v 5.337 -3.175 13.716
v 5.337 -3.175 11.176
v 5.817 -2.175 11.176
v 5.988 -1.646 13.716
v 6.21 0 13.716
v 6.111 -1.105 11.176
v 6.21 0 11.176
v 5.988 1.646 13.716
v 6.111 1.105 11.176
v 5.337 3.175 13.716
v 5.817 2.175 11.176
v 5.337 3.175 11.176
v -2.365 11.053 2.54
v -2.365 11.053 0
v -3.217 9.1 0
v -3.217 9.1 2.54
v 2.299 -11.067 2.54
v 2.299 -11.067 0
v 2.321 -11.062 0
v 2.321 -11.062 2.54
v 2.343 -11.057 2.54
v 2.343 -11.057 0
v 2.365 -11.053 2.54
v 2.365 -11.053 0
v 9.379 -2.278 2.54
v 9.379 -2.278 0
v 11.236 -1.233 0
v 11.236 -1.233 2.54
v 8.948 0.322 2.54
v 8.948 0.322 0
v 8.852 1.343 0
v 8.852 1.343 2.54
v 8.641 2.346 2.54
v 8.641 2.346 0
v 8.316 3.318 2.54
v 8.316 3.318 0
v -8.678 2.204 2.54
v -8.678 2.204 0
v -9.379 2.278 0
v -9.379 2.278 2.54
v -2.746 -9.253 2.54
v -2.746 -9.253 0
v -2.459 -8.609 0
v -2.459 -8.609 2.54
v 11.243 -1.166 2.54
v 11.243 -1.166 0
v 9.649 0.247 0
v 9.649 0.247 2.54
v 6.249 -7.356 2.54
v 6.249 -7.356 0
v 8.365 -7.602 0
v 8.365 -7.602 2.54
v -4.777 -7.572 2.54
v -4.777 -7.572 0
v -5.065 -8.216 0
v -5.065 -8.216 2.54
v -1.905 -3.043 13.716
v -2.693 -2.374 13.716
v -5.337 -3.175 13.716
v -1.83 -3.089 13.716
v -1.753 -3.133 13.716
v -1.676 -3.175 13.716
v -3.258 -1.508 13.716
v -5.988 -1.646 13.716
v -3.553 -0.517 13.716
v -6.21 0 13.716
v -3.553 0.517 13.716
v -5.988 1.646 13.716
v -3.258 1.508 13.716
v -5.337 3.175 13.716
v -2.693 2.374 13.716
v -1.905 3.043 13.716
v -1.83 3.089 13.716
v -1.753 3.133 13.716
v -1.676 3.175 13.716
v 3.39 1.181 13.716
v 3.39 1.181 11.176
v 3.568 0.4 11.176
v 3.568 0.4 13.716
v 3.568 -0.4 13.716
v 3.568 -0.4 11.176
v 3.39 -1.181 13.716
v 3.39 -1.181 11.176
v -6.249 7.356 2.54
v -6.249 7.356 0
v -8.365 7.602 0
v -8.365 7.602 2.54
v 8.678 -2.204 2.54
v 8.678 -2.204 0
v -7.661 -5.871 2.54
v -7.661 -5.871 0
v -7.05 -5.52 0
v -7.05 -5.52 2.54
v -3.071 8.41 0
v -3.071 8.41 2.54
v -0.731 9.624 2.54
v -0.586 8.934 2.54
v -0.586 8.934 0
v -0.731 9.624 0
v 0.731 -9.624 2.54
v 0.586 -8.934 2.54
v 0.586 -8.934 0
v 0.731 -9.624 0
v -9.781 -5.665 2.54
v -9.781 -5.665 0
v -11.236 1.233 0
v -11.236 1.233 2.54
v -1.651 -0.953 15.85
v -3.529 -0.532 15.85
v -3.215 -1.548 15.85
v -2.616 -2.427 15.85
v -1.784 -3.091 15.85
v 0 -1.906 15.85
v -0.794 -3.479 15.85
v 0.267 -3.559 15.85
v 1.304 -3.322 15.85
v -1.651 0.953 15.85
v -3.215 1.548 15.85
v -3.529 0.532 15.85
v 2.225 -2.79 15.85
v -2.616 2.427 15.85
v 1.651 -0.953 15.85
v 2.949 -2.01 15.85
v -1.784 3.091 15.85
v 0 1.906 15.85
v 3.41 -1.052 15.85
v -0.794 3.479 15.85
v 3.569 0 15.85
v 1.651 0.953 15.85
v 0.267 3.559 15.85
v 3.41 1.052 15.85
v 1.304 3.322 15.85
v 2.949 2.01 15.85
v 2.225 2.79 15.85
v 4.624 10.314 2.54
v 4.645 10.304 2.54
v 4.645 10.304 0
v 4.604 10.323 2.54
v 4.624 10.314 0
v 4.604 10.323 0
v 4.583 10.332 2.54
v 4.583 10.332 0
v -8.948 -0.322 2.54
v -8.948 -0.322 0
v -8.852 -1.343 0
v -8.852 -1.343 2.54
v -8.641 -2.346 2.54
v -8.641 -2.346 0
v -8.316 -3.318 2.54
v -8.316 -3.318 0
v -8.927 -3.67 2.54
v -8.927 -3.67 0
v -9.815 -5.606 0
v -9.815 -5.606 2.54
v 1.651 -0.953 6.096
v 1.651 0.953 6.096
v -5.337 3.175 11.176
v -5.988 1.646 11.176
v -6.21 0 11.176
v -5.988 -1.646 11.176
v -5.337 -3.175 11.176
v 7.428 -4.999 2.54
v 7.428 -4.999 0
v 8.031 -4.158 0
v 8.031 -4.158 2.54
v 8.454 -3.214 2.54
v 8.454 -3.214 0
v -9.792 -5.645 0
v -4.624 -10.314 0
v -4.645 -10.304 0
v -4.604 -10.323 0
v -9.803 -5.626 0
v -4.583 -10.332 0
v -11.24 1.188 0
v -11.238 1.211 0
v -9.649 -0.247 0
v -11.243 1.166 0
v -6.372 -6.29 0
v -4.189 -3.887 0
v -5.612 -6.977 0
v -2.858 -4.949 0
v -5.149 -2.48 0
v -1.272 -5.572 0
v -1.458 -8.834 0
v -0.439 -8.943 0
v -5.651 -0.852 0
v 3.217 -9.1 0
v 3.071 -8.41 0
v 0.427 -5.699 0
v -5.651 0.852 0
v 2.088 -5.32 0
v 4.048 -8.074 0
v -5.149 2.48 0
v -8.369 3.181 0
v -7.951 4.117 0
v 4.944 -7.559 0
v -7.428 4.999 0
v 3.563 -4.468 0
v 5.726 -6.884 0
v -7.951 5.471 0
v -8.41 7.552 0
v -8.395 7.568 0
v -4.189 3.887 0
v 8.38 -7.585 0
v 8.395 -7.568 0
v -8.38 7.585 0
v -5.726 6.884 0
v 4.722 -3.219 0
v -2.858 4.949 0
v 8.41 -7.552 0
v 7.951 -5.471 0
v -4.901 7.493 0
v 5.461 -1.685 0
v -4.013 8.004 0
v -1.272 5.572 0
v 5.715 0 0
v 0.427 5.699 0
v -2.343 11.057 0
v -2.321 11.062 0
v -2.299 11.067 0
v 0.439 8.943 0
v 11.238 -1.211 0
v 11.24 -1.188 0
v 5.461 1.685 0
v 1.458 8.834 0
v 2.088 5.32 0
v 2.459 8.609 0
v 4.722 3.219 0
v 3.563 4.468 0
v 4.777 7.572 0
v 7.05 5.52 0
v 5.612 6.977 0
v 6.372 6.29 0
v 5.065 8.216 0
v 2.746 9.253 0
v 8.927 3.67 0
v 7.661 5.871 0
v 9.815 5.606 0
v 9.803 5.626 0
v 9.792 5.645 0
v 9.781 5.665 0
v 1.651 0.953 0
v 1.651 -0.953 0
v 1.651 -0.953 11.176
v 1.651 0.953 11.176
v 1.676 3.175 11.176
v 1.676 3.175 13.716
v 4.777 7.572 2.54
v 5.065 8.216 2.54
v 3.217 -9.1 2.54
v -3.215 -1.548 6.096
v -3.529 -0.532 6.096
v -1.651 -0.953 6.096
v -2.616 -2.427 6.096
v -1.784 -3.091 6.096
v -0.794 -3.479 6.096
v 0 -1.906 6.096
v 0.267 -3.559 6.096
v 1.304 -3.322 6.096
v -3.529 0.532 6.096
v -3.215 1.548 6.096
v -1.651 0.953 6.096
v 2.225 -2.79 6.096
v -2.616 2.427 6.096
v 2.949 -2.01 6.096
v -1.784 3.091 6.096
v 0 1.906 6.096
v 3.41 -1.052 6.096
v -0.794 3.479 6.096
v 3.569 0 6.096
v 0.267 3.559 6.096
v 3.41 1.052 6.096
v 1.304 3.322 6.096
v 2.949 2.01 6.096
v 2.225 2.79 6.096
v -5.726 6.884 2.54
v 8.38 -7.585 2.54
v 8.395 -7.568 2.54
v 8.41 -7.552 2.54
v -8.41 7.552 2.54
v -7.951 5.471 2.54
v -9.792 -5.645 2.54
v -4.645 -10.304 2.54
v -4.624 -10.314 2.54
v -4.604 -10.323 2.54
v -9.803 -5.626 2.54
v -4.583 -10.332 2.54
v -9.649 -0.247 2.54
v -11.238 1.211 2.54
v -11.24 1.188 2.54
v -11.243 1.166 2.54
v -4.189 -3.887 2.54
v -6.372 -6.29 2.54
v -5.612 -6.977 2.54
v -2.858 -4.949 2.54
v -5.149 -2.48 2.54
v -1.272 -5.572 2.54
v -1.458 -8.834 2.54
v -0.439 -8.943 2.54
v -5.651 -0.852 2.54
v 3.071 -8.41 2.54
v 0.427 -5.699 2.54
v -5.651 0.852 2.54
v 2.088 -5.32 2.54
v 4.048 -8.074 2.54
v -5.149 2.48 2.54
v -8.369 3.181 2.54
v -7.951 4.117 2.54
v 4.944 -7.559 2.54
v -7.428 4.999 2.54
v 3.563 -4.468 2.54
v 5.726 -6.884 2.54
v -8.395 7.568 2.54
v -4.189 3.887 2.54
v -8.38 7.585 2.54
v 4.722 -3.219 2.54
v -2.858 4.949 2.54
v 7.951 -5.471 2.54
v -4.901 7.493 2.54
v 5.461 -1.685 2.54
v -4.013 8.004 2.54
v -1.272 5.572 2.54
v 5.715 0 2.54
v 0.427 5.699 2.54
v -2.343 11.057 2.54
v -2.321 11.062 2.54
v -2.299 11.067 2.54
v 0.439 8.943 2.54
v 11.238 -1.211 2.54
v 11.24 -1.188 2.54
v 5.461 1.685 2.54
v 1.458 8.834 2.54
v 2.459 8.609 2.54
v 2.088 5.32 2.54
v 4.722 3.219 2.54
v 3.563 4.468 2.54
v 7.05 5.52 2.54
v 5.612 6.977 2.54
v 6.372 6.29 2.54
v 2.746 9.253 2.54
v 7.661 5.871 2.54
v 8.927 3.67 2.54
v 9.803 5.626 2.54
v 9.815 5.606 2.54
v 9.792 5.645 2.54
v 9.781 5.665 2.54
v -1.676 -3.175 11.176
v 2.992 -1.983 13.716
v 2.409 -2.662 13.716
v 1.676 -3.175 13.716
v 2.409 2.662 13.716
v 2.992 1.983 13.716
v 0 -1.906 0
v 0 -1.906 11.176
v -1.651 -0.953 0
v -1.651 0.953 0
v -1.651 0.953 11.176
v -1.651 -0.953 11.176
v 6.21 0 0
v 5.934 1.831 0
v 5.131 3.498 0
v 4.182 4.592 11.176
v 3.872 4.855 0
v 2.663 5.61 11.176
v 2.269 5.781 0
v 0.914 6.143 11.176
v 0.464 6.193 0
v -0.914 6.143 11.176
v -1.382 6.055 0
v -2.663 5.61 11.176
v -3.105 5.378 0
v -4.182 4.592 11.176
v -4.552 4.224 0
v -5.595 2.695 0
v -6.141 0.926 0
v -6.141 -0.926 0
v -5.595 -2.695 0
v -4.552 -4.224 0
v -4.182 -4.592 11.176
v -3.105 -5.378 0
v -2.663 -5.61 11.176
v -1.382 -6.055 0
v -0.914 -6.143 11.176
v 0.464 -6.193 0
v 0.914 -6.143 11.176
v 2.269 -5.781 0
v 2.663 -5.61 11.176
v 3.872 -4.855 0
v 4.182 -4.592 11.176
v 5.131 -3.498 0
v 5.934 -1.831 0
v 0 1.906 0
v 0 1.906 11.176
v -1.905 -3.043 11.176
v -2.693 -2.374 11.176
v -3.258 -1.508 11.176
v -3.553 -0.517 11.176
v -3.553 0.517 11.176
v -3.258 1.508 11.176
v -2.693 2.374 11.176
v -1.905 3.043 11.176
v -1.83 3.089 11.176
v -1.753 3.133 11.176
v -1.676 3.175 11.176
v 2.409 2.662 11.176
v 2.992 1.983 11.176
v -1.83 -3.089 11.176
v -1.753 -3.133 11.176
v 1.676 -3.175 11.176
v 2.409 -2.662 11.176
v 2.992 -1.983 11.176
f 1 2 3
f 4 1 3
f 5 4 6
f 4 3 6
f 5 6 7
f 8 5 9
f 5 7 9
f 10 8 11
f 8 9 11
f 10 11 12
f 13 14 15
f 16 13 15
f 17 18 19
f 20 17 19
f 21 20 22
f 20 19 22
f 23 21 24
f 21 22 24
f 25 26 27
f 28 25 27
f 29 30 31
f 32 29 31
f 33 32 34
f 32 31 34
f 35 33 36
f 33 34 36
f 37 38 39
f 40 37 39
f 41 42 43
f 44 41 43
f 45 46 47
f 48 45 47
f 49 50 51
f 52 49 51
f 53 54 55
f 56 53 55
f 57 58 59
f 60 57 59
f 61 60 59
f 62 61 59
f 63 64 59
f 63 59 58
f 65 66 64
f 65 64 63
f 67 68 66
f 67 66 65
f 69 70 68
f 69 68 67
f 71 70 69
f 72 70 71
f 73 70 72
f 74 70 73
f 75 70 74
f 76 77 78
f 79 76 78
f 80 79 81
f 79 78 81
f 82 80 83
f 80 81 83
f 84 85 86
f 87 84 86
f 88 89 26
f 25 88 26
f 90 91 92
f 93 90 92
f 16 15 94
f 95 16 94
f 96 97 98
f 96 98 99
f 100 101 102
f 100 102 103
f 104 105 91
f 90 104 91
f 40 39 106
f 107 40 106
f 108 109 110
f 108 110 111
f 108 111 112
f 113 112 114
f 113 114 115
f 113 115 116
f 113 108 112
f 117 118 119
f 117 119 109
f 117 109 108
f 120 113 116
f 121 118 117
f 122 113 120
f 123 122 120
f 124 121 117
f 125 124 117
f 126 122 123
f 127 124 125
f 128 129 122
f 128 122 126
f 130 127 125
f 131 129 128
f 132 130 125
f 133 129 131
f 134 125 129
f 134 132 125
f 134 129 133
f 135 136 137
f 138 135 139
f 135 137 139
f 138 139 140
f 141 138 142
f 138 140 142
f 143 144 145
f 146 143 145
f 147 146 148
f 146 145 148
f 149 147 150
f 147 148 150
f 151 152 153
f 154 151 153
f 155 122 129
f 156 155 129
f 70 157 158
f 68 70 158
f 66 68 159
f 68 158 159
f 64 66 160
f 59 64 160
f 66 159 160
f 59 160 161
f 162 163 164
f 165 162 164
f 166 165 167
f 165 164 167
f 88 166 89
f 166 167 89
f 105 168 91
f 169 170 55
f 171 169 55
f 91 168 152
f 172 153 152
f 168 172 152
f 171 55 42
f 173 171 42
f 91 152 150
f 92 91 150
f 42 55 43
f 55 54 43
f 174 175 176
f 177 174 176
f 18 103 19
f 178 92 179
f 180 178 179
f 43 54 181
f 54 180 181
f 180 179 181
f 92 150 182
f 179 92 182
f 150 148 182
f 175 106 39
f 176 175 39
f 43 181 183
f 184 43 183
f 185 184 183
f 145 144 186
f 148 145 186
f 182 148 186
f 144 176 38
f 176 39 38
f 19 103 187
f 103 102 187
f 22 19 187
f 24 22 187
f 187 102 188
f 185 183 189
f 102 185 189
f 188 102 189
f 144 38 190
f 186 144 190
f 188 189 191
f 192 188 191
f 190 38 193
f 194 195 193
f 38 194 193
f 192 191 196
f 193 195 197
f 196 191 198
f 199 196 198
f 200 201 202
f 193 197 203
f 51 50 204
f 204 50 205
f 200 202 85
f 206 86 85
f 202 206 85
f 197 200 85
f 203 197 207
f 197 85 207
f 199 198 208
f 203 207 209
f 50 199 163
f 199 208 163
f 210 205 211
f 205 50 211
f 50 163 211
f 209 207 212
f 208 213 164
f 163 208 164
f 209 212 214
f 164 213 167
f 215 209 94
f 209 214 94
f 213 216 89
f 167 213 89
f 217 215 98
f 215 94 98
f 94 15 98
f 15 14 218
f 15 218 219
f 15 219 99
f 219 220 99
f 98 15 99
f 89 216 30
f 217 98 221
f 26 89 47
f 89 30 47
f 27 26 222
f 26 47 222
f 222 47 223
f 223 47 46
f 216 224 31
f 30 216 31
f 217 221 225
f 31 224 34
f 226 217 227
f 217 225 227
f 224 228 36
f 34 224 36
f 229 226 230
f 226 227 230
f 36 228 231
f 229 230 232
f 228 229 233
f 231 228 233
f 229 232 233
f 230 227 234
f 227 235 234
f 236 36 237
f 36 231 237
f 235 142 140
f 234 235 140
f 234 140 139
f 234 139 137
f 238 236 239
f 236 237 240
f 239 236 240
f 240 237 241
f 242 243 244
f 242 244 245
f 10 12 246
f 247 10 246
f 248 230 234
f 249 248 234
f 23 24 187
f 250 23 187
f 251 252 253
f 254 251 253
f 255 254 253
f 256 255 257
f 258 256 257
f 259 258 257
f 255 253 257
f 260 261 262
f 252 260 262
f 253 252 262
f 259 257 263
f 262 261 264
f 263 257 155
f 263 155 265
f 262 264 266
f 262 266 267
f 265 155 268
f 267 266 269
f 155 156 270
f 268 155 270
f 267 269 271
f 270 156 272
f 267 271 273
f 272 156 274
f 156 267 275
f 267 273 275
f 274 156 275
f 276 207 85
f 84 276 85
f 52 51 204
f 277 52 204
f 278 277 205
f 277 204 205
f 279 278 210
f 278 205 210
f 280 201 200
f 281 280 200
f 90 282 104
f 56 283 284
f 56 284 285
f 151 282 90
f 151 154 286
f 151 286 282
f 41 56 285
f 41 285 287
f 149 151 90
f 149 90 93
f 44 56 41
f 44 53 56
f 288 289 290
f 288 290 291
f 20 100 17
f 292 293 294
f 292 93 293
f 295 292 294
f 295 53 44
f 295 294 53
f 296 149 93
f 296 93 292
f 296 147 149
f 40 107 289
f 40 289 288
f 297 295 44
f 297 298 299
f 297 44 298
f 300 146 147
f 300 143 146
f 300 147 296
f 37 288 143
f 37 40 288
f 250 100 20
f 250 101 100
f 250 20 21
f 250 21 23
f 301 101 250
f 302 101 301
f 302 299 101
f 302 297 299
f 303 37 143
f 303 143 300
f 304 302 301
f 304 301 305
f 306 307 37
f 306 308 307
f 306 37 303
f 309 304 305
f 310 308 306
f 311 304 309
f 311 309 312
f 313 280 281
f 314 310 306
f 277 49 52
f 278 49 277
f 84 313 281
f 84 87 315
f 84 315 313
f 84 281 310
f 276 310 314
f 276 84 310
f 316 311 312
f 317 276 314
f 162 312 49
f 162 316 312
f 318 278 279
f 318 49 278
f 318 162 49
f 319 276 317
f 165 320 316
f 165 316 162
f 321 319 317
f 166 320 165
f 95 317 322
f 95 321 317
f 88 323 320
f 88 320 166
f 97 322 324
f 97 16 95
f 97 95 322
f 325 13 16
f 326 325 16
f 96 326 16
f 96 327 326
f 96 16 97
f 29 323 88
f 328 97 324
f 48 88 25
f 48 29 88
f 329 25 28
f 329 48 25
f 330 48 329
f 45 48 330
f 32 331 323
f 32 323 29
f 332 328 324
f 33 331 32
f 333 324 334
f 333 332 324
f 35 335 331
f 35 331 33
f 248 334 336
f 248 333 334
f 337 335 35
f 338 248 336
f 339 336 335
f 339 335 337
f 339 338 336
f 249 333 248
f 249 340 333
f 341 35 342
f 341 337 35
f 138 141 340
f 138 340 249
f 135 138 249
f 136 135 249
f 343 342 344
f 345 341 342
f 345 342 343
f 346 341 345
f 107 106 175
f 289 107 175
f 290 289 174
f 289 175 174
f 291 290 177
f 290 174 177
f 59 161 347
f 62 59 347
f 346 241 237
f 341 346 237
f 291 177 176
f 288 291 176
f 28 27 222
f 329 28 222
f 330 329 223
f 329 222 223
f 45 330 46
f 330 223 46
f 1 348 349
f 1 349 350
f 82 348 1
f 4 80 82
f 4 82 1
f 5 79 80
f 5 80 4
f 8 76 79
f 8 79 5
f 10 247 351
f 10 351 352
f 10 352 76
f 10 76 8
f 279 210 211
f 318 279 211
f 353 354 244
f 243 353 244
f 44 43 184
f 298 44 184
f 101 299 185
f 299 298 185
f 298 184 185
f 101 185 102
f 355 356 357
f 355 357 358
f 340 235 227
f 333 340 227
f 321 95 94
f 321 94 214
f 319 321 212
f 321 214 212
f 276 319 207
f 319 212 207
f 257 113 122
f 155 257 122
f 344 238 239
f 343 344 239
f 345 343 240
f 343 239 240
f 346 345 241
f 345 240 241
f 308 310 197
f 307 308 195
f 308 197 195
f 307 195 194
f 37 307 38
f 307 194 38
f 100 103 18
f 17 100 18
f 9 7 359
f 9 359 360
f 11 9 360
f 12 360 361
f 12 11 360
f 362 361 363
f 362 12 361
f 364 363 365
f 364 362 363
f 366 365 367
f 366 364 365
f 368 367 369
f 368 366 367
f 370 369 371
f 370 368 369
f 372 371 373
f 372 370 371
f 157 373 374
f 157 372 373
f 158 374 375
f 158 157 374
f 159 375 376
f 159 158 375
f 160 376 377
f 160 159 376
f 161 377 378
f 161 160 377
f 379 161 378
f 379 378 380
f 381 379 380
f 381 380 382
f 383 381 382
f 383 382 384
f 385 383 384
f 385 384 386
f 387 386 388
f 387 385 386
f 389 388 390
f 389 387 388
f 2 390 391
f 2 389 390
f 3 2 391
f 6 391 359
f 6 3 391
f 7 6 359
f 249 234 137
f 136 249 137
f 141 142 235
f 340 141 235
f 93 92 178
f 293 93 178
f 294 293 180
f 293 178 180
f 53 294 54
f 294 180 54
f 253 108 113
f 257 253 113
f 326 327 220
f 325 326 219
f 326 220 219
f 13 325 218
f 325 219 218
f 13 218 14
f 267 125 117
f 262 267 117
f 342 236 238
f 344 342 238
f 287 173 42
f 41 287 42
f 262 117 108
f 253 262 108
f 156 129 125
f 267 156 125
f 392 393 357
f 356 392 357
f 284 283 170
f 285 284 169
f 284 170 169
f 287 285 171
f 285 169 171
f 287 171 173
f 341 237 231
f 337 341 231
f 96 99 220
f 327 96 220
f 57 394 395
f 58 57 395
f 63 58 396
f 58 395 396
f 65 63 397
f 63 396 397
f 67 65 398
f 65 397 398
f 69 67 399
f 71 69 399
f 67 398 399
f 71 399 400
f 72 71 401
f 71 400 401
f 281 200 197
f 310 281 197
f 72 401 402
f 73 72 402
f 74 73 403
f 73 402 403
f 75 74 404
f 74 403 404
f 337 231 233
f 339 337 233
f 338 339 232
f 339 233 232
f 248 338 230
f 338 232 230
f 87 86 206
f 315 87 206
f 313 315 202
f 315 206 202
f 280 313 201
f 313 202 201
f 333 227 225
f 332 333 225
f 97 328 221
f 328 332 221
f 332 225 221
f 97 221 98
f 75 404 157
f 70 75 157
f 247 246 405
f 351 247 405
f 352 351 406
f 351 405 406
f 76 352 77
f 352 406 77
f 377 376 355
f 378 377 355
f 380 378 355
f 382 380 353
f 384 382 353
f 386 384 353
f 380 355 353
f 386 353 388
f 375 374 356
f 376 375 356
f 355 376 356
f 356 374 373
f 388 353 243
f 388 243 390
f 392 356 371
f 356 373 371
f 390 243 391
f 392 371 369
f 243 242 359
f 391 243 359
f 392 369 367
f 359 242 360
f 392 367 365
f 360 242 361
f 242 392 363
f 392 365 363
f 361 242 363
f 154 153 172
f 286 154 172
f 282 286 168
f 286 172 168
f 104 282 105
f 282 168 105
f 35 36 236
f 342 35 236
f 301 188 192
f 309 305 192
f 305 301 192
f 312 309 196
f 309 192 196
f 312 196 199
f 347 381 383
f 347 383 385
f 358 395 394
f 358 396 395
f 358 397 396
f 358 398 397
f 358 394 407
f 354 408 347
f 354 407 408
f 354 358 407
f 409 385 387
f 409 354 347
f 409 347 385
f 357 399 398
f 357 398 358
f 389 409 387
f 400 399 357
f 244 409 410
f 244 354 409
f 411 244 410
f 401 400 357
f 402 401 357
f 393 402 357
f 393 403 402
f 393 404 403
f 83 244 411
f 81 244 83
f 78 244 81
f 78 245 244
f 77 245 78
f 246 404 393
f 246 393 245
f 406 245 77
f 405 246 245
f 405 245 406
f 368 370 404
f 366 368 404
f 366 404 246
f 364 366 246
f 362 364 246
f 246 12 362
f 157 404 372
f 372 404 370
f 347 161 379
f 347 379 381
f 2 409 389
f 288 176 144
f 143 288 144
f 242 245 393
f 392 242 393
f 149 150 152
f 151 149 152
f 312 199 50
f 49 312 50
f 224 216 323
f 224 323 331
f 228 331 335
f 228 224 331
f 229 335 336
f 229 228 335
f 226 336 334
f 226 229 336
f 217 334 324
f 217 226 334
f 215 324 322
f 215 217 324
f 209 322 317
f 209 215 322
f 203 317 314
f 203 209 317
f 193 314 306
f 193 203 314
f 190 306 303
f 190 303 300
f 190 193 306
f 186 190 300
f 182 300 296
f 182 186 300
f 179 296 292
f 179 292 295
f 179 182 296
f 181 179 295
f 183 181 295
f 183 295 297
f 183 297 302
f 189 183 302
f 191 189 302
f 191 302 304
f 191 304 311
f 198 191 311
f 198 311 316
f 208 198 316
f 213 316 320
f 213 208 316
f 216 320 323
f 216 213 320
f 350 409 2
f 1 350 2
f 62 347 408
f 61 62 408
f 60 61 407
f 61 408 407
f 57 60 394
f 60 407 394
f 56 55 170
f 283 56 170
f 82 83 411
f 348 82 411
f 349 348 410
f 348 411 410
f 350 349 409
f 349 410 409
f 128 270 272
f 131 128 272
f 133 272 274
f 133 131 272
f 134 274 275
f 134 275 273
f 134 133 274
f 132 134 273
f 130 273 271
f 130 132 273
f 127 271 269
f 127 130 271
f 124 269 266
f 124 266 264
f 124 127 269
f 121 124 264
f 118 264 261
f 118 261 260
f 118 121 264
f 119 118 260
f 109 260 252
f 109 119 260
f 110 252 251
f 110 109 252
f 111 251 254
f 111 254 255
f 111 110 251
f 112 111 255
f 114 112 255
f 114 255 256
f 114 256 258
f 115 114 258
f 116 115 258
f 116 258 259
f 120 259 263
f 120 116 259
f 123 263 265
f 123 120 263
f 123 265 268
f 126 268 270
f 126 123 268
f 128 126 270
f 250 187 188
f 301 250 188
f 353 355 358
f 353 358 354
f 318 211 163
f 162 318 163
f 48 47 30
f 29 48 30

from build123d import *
from build123d import SkipClean  # not in build123d's __all__

# Parameters (mm, degrees)
F0_R           = 11.303
F0_R_2         = 5.715
F1_DEPTH       = 2.54
F5_R           = 3.5687
F6_DEPTH       = 4.6736
F6_DEPTH_BACK  = 5.08
F8_DEPTH       = 50.8
F10_DEPTH      = 25.4
F13_DEPTH      = 25.4
F4_R           = 6.2103
F15_DEPTH      = 11.176
F16_DEPTH      = 50.8
F16_DEPTH_BACK = 50.8
F18_DEPTH      = 2.54


with BuildPart() as f1:
    # F0 (on Top) → F1 (new body)
    with BuildSketch(Plane.XY):
        Circle(F0_R)
        Circle(F0_R_2, mode=Mode.SUBTRACT)
    extrude(amount=F1_DEPTH)

    # F9 (on face) → F10 (cut)
    with BuildSketch(Plane(origin=(0, 0, 0), x_dir=(1, 0, 0), z_dir=(0, 0, -1))):
        with BuildLine():
            Line((-8.9271557155, 3.6697404311), (-9.8146830534, 5.6062291749))
            ThreePointArc((-9.8146830534, 5.6062291749), (-11.0597926204, 2.3321226799), (-11.242701421, -1.1659647326))
            Line((-11.242701421, -1.1659647326), (-9.6488317662, 0.2472843445))
            Line((-9.6488317662, 0.2472843445), (-8.9477035333, 0.3221237808))
            ThreePointArc((-8.9477035333, 0.3221237808), (-8.7608469633, 1.847355606), (-8.3159415428, 3.3181739717))
            Line((-8.3159415428, 3.3181739717), (-8.9271557155, 3.6697404311))
        make_face()
        with BuildLine():
            Line((-4.7773643073, 7.5724469312), (-5.0652013801, 8.2161328482))
            Line((-5.0652013801, 8.2161328482), (-4.6449865546, 10.3044606316))
            ThreePointArc((-4.6449865546, 10.3044606316), (-7.5767728664, 8.3875098767), (-9.7808733868, 5.6650088077))
            Line((-9.7808733868, 5.6650088077), (-7.6607187839, 5.8714982512))
            Line((-7.6607187839, 5.8714982512), (-7.0495046113, 5.5199317918))
            ThreePointArc((-7.0495046113, 5.5199317918), (-6.0018256975, 6.6440387225), (-4.7773643073, 7.5724469312))
        make_face()
        with BuildLine():
            ThreePointArc((2.2989369307, 11.0667383627), (-1.1996834025, 11.2391533815), (-4.5830841585, 10.33214153))
            Line((-4.5830841585, 10.33214153), (-2.7464716044, 9.2529993908))
            Line((-2.7464716044, 9.2529993908), (-2.4586345316, 8.6093134738))
            ThreePointArc((-2.4586345316, 8.6093134738), (-0.9503110098, 8.9029248696), (0.586003717, 8.934302541))
            Line((0.586003717, 8.934302541), (0.7314877226, 9.6242417733))
            Line((0.7314877226, 9.6242417733), (2.2989369307, 11.0667383627))
        make_face()
        with BuildLine():
            ThreePointArc((8.3647446465, 7.6018981839), (5.6356443454, 9.7978222995), (2.3652874451, 11.0527473644))
            Line((2.3652874451, 11.0527473644), (3.2168343788, 9.100169261))
            Line((3.2168343788, 9.100169261), (3.0713503732, 8.4102300286))
            ThreePointArc((3.0713503732, 8.4102300286), (4.5083713952, 7.8380073479), (5.7255382389, 6.8835582459))
            Line((5.7255382389, 6.8835582459), (6.2487733776, 7.356217457))
            Line((6.2487733776, 7.356217457), (8.3647446465, 7.6018981839))
        make_face()
        with BuildLine():
            ThreePointArc((11.2355042146, 1.2333912778), (10.3183475019, 4.6140561147), (8.4101996378, 7.5515793747))
            Line((8.4101996378, 7.5515793747), (7.9514189656, 5.4713837769))
            Line((7.9514189656, 5.4713837769), (7.4281838269, 4.9987245658))
            ThreePointArc((7.4281838269, 4.9987245658), (8.2664076362, 3.6964900333), (8.6781117575, 2.2035286644))
            Line((8.6781117575, 2.2035286644), (9.3792399904, 2.2783681008))
            Line((9.3792399904, 2.2783681008), (11.2355042146, 1.2333912778))
        make_face()
        with BuildLine():
            ThreePointArc((11.303, 0), (11.2879152894, 0.5837614402), (11.242701421, 1.1659647326))
            Line((11.242701421, 1.1659647326), (9.6488317662, -0.2472843445))
            Line((9.6488317662, -0.2472843445), (8.9477035333, -0.3221237809))
            ThreePointArc((8.9477035333, -0.3221237808), (8.7608469633, -1.847355606), (8.3159415428, -3.3181739717))
            Line((8.3159415428, -3.3181739717), (8.9271557155, -3.6697404311))
            Line((8.9271557155, -3.6697404311), (9.8146830534, -5.6062291749))
            ThreePointArc((9.8146830534, -5.6062291749), (10.9245862977, -2.900210893), (11.303, 0))
        make_face()
        with BuildLine():
            ThreePointArc((4.6449865546, -10.3044606316), (7.5767728664, -8.3875098767), (9.7808733868, -5.6650088077))
            Line((9.7808733868, -5.6650088077), (7.6607187839, -5.8714982512))
            Line((7.6607187839, -5.8714982512), (7.0495046113, -5.5199317918))
            ThreePointArc((7.0495046113, -5.5199317918), (6.0018256975, -6.6440387225), (4.7773643073, -7.5724469312))
            Line((4.7773643073, -7.5724469312), (5.0652013801, -8.2161328482))
            Line((5.0652013801, -8.2161328482), (4.6449865546, -10.3044606316))
        make_face()
        with BuildLine():
            Line((-0.7314877226, -9.6242417733), (-2.2989369307, -11.0667383627))
            ThreePointArc((-2.2989369307, -11.0667383627), (1.1996834025, -11.2391533815), (4.5830841585, -10.33214153))
            Line((4.5830841585, -10.33214153), (2.7464716044, -9.2529993908))
            Line((2.7464716044, -9.2529993908), (2.4586345316, -8.6093134738))
            ThreePointArc((2.4586345316, -8.6093134738), (0.9503110098, -8.9029248696), (-0.586003717, -8.934302541))
            Line((-0.586003717, -8.934302541), (-0.7314877226, -9.6242417733))
        make_face()
        with BuildLine():
            Line((-6.2487733776, -7.356217457), (-8.3647446465, -7.6018981839))
            ThreePointArc((-8.3647446465, -7.6018981839), (-5.6356443454, -9.7978222995), (-2.3652874451, -11.0527473644))
            Line((-2.3652874451, -11.0527473644), (-3.2168343788, -9.100169261))
            Line((-3.2168343788, -9.100169261), (-3.0713503732, -8.4102300286))
            ThreePointArc((-3.0713503732, -8.4102300286), (-4.4641901838, -7.7611963159), (-5.7255382389, -6.8835582459))
            Line((-5.7255382389, -6.8835582459), (-6.2487733776, -7.356217457))
        make_face()
        with BuildLine():
            Line((-9.3792399904, -2.2783681008), (-11.2355042146, -1.2333912778))
            ThreePointArc((-11.2355042146, -1.2333912778), (-10.3183475019, -4.6140561147), (-8.4101996378, -7.5515793747))
            Line((-8.4101996378, -7.5515793747), (-7.9514189656, -5.4713837769))
            Line((-7.9514189656, -5.4713837769), (-7.4281838269, -4.9987245658))
            ThreePointArc((-7.4281838269, -4.9987245658), (-8.1735224594, -3.6549545628), (-8.6781117575, -2.2035286644))
            Line((-8.6781117575, -2.2035286644), (-9.3792399904, -2.2783681008))
        make_face()
    extrude(amount=-F10_DEPTH, mode=Mode.SUBTRACT)


with BuildPart() as f6:
    # F5 (on offset) → F6 (new body, two sides)
    with BuildSketch(Plane.XY.offset(11.176)) as f6_sk:
        Circle(F5_R)
    extrude(amount=F6_DEPTH)
    extrude(f6_sk.sketch, amount=-F6_DEPTH_BACK)

    # F7 (on offset) → F8 (cut)
    with BuildSketch(Plane.XY.offset(11.176)):
        Polygon((1.5165992773, 0.4486275472), (0.369776786, 1.5377272751), (-1.1468224914, 1.089099728), (-1.5165992773, -0.4486275472), (-0.369776786, -1.5377272751), (1.1468224914, -1.089099728), align=None)
    extrude(amount=-F8_DEPTH, mode=Mode.SUBTRACT)

    # F12 (on face) → F13 (cut)
    with BuildSketch(Plane.XY.offset(15.8496)):
        Polygon((0, 1.9064105889), (-1.651, 0.9532052944), (-1.651, -0.9532052944), (0, -1.9064105889), (1.651, -0.9532052944), (1.651, 0.9532052944), align=None)
    extrude(amount=-F13_DEPTH, mode=Mode.SUBTRACT)


with BuildPart() as f15:
    # F4 (on offset) → F15 (new body, through all)
    with BuildSketch(Plane.XY.offset(11.176)):
        Circle(F4_R)
    extrude(amount=-F15_DEPTH)

    # F14 (on face) → F16 (cut, two sides)
    with BuildSketch(Plane.XY.offset(2.54)) as f16_sk:
        Polygon((0, 1.9064105889), (-1.651, 0.9532052944), (-1.651, -0.9532052944), (0, -1.9064105889), (1.651, -0.9532052944), (1.651, 0.9532052944), align=None)
    extrude(amount=-F16_DEPTH, mode=Mode.SUBTRACT)
    extrude(f16_sk.sketch, amount=F16_DEPTH_BACK, mode=Mode.SUBTRACT)

    # F17 (on face) → F18 (join)
    with BuildSketch(Plane.XY.offset(11.176)):
        with BuildLine():
            ThreePointArc((-1.6756872114, -3.175), (-1.7915606918, -3.1110870959), (-1.905, -3.0429471948))
            ThreePointArc((-1.905, -3.0429471948), (-3.5900630399, 0), (-1.905, 3.0429471948))
            ThreePointArc((-1.905, 3.0429471948), (-1.7915606918, 3.1110870959), (-1.6756872114, 3.175))
            Line((-1.6756872114, 3.175), (-5.3373402637, 3.175))
            ThreePointArc((-5.3373402637, 3.175), (-6.2103, 0), (-5.3373402637, -3.175))
            Line((-5.3373402637, -3.175), (-1.6756872114, -3.175))
        make_face()
        with BuildLine():
            ThreePointArc((1.6756872114, 3.175), (2.7219479771, 2.340844258), (3.3900758016, 1.1814984934))
            ThreePointArc((3.3900758016, 1.1814984934), (3.5900630399, 0), (3.3900758016, -1.1814984934))
            ThreePointArc((3.3900758016, -1.1814984934), (2.7219479771, -2.340844258), (1.6756872114, -3.175))
            Line((1.6756872114, -3.175), (5.3373402637, -3.175))
            ThreePointArc((5.3373402637, -3.175), (6.2103, 0), (5.3373402637, 3.175))
            Line((5.3373402637, 3.175), (1.6756872114, 3.175))
        make_face()
    with SkipClean():  # cleaning this boolean's faces spoils the solid; the shape is the same uncleaned
        extrude(amount=F18_DEPTH)


solid = Compound([f1.part, f6.part, f15.part])
